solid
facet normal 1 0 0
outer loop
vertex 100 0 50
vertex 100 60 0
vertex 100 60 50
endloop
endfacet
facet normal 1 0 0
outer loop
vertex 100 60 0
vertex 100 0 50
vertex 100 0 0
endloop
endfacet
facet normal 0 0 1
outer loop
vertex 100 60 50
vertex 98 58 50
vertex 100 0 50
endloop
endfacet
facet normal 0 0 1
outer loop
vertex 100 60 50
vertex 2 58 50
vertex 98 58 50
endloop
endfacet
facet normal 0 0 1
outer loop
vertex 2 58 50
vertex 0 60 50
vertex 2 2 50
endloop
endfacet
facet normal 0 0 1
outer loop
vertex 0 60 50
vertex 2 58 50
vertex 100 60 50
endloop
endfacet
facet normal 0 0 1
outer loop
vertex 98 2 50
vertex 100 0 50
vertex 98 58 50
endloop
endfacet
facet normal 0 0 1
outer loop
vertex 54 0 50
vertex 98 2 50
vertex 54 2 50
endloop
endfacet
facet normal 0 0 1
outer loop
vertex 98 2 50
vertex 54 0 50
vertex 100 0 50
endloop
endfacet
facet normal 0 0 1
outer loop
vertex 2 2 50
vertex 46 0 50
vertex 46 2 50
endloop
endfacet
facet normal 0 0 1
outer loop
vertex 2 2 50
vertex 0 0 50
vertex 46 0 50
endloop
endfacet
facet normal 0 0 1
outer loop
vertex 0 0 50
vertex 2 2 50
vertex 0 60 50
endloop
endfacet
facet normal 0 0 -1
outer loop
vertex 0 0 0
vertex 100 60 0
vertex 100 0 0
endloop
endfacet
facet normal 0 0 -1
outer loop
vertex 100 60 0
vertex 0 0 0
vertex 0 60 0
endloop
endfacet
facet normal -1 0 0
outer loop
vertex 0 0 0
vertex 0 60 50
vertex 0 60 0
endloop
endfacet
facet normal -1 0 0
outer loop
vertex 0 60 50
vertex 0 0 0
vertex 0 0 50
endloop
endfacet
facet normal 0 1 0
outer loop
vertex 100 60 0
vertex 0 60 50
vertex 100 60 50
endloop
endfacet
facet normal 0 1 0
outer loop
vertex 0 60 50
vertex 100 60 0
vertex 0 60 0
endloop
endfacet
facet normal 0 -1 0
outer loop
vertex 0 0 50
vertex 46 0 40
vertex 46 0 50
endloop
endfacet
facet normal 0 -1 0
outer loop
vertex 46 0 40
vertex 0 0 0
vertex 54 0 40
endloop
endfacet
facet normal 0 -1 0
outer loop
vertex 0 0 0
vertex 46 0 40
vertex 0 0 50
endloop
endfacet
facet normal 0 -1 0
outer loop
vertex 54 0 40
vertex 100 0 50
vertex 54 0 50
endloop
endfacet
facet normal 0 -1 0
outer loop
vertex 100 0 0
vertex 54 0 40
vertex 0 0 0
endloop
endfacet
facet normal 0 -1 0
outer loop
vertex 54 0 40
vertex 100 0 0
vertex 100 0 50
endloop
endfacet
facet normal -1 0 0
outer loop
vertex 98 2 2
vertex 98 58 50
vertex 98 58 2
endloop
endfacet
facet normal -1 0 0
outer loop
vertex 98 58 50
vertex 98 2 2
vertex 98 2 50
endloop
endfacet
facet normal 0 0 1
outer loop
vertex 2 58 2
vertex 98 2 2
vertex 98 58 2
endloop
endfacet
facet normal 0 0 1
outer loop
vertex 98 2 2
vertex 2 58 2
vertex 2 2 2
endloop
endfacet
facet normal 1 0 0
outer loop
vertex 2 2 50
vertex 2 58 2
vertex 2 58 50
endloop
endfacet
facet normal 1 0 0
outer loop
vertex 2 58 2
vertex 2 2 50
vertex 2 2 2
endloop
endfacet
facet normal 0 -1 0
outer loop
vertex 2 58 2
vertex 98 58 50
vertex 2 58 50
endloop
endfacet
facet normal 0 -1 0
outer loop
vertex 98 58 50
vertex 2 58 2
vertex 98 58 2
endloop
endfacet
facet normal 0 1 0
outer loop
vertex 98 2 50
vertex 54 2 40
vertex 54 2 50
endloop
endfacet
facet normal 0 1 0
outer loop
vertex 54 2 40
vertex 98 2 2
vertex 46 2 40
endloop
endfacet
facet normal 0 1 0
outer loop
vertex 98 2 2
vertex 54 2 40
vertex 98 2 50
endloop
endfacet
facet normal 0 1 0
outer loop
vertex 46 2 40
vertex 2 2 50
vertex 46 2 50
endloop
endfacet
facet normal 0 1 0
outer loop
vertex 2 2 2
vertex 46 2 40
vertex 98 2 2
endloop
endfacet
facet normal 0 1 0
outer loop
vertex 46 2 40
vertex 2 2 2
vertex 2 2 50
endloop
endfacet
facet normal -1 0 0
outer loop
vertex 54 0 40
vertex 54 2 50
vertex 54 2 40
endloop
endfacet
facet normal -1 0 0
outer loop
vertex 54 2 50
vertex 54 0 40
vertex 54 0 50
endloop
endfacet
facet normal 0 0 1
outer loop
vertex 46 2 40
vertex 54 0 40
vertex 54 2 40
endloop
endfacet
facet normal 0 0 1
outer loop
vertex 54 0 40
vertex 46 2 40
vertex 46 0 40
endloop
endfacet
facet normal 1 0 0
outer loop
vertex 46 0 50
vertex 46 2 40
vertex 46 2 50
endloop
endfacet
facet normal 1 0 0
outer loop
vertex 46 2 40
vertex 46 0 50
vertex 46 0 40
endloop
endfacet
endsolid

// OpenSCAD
$fn = 32;

// ----------------------------------------------------------------------
// Enclosure box: notch enclosure
// ----------------------------------------------------------------------

// --- parameters (mm) ---
box_l = 100;              // outer length, X
box_w = 60;               // outer width, Y
box_h = 50;               // outer height
wall_t = 2;               // wall thickness
notch_w = 8;              // cable notch width
notch_h = 10;             // cable notch height

inner_h = box_h - wall_t;  // cavity depth
boss_h = inner_h - 2;  // corner boss height

difference() {
  cube([box_l, box_w, box_h]);
  translate([wall_t, wall_t, wall_t])
    cube([box_l - 2 * wall_t, box_w - 2 * wall_t, box_h]);
  translate([box_l / 2 - notch_w / 2, -1, box_h - notch_h])
    cube([notch_w, wall_t + 2, notch_h + 1]);
}
